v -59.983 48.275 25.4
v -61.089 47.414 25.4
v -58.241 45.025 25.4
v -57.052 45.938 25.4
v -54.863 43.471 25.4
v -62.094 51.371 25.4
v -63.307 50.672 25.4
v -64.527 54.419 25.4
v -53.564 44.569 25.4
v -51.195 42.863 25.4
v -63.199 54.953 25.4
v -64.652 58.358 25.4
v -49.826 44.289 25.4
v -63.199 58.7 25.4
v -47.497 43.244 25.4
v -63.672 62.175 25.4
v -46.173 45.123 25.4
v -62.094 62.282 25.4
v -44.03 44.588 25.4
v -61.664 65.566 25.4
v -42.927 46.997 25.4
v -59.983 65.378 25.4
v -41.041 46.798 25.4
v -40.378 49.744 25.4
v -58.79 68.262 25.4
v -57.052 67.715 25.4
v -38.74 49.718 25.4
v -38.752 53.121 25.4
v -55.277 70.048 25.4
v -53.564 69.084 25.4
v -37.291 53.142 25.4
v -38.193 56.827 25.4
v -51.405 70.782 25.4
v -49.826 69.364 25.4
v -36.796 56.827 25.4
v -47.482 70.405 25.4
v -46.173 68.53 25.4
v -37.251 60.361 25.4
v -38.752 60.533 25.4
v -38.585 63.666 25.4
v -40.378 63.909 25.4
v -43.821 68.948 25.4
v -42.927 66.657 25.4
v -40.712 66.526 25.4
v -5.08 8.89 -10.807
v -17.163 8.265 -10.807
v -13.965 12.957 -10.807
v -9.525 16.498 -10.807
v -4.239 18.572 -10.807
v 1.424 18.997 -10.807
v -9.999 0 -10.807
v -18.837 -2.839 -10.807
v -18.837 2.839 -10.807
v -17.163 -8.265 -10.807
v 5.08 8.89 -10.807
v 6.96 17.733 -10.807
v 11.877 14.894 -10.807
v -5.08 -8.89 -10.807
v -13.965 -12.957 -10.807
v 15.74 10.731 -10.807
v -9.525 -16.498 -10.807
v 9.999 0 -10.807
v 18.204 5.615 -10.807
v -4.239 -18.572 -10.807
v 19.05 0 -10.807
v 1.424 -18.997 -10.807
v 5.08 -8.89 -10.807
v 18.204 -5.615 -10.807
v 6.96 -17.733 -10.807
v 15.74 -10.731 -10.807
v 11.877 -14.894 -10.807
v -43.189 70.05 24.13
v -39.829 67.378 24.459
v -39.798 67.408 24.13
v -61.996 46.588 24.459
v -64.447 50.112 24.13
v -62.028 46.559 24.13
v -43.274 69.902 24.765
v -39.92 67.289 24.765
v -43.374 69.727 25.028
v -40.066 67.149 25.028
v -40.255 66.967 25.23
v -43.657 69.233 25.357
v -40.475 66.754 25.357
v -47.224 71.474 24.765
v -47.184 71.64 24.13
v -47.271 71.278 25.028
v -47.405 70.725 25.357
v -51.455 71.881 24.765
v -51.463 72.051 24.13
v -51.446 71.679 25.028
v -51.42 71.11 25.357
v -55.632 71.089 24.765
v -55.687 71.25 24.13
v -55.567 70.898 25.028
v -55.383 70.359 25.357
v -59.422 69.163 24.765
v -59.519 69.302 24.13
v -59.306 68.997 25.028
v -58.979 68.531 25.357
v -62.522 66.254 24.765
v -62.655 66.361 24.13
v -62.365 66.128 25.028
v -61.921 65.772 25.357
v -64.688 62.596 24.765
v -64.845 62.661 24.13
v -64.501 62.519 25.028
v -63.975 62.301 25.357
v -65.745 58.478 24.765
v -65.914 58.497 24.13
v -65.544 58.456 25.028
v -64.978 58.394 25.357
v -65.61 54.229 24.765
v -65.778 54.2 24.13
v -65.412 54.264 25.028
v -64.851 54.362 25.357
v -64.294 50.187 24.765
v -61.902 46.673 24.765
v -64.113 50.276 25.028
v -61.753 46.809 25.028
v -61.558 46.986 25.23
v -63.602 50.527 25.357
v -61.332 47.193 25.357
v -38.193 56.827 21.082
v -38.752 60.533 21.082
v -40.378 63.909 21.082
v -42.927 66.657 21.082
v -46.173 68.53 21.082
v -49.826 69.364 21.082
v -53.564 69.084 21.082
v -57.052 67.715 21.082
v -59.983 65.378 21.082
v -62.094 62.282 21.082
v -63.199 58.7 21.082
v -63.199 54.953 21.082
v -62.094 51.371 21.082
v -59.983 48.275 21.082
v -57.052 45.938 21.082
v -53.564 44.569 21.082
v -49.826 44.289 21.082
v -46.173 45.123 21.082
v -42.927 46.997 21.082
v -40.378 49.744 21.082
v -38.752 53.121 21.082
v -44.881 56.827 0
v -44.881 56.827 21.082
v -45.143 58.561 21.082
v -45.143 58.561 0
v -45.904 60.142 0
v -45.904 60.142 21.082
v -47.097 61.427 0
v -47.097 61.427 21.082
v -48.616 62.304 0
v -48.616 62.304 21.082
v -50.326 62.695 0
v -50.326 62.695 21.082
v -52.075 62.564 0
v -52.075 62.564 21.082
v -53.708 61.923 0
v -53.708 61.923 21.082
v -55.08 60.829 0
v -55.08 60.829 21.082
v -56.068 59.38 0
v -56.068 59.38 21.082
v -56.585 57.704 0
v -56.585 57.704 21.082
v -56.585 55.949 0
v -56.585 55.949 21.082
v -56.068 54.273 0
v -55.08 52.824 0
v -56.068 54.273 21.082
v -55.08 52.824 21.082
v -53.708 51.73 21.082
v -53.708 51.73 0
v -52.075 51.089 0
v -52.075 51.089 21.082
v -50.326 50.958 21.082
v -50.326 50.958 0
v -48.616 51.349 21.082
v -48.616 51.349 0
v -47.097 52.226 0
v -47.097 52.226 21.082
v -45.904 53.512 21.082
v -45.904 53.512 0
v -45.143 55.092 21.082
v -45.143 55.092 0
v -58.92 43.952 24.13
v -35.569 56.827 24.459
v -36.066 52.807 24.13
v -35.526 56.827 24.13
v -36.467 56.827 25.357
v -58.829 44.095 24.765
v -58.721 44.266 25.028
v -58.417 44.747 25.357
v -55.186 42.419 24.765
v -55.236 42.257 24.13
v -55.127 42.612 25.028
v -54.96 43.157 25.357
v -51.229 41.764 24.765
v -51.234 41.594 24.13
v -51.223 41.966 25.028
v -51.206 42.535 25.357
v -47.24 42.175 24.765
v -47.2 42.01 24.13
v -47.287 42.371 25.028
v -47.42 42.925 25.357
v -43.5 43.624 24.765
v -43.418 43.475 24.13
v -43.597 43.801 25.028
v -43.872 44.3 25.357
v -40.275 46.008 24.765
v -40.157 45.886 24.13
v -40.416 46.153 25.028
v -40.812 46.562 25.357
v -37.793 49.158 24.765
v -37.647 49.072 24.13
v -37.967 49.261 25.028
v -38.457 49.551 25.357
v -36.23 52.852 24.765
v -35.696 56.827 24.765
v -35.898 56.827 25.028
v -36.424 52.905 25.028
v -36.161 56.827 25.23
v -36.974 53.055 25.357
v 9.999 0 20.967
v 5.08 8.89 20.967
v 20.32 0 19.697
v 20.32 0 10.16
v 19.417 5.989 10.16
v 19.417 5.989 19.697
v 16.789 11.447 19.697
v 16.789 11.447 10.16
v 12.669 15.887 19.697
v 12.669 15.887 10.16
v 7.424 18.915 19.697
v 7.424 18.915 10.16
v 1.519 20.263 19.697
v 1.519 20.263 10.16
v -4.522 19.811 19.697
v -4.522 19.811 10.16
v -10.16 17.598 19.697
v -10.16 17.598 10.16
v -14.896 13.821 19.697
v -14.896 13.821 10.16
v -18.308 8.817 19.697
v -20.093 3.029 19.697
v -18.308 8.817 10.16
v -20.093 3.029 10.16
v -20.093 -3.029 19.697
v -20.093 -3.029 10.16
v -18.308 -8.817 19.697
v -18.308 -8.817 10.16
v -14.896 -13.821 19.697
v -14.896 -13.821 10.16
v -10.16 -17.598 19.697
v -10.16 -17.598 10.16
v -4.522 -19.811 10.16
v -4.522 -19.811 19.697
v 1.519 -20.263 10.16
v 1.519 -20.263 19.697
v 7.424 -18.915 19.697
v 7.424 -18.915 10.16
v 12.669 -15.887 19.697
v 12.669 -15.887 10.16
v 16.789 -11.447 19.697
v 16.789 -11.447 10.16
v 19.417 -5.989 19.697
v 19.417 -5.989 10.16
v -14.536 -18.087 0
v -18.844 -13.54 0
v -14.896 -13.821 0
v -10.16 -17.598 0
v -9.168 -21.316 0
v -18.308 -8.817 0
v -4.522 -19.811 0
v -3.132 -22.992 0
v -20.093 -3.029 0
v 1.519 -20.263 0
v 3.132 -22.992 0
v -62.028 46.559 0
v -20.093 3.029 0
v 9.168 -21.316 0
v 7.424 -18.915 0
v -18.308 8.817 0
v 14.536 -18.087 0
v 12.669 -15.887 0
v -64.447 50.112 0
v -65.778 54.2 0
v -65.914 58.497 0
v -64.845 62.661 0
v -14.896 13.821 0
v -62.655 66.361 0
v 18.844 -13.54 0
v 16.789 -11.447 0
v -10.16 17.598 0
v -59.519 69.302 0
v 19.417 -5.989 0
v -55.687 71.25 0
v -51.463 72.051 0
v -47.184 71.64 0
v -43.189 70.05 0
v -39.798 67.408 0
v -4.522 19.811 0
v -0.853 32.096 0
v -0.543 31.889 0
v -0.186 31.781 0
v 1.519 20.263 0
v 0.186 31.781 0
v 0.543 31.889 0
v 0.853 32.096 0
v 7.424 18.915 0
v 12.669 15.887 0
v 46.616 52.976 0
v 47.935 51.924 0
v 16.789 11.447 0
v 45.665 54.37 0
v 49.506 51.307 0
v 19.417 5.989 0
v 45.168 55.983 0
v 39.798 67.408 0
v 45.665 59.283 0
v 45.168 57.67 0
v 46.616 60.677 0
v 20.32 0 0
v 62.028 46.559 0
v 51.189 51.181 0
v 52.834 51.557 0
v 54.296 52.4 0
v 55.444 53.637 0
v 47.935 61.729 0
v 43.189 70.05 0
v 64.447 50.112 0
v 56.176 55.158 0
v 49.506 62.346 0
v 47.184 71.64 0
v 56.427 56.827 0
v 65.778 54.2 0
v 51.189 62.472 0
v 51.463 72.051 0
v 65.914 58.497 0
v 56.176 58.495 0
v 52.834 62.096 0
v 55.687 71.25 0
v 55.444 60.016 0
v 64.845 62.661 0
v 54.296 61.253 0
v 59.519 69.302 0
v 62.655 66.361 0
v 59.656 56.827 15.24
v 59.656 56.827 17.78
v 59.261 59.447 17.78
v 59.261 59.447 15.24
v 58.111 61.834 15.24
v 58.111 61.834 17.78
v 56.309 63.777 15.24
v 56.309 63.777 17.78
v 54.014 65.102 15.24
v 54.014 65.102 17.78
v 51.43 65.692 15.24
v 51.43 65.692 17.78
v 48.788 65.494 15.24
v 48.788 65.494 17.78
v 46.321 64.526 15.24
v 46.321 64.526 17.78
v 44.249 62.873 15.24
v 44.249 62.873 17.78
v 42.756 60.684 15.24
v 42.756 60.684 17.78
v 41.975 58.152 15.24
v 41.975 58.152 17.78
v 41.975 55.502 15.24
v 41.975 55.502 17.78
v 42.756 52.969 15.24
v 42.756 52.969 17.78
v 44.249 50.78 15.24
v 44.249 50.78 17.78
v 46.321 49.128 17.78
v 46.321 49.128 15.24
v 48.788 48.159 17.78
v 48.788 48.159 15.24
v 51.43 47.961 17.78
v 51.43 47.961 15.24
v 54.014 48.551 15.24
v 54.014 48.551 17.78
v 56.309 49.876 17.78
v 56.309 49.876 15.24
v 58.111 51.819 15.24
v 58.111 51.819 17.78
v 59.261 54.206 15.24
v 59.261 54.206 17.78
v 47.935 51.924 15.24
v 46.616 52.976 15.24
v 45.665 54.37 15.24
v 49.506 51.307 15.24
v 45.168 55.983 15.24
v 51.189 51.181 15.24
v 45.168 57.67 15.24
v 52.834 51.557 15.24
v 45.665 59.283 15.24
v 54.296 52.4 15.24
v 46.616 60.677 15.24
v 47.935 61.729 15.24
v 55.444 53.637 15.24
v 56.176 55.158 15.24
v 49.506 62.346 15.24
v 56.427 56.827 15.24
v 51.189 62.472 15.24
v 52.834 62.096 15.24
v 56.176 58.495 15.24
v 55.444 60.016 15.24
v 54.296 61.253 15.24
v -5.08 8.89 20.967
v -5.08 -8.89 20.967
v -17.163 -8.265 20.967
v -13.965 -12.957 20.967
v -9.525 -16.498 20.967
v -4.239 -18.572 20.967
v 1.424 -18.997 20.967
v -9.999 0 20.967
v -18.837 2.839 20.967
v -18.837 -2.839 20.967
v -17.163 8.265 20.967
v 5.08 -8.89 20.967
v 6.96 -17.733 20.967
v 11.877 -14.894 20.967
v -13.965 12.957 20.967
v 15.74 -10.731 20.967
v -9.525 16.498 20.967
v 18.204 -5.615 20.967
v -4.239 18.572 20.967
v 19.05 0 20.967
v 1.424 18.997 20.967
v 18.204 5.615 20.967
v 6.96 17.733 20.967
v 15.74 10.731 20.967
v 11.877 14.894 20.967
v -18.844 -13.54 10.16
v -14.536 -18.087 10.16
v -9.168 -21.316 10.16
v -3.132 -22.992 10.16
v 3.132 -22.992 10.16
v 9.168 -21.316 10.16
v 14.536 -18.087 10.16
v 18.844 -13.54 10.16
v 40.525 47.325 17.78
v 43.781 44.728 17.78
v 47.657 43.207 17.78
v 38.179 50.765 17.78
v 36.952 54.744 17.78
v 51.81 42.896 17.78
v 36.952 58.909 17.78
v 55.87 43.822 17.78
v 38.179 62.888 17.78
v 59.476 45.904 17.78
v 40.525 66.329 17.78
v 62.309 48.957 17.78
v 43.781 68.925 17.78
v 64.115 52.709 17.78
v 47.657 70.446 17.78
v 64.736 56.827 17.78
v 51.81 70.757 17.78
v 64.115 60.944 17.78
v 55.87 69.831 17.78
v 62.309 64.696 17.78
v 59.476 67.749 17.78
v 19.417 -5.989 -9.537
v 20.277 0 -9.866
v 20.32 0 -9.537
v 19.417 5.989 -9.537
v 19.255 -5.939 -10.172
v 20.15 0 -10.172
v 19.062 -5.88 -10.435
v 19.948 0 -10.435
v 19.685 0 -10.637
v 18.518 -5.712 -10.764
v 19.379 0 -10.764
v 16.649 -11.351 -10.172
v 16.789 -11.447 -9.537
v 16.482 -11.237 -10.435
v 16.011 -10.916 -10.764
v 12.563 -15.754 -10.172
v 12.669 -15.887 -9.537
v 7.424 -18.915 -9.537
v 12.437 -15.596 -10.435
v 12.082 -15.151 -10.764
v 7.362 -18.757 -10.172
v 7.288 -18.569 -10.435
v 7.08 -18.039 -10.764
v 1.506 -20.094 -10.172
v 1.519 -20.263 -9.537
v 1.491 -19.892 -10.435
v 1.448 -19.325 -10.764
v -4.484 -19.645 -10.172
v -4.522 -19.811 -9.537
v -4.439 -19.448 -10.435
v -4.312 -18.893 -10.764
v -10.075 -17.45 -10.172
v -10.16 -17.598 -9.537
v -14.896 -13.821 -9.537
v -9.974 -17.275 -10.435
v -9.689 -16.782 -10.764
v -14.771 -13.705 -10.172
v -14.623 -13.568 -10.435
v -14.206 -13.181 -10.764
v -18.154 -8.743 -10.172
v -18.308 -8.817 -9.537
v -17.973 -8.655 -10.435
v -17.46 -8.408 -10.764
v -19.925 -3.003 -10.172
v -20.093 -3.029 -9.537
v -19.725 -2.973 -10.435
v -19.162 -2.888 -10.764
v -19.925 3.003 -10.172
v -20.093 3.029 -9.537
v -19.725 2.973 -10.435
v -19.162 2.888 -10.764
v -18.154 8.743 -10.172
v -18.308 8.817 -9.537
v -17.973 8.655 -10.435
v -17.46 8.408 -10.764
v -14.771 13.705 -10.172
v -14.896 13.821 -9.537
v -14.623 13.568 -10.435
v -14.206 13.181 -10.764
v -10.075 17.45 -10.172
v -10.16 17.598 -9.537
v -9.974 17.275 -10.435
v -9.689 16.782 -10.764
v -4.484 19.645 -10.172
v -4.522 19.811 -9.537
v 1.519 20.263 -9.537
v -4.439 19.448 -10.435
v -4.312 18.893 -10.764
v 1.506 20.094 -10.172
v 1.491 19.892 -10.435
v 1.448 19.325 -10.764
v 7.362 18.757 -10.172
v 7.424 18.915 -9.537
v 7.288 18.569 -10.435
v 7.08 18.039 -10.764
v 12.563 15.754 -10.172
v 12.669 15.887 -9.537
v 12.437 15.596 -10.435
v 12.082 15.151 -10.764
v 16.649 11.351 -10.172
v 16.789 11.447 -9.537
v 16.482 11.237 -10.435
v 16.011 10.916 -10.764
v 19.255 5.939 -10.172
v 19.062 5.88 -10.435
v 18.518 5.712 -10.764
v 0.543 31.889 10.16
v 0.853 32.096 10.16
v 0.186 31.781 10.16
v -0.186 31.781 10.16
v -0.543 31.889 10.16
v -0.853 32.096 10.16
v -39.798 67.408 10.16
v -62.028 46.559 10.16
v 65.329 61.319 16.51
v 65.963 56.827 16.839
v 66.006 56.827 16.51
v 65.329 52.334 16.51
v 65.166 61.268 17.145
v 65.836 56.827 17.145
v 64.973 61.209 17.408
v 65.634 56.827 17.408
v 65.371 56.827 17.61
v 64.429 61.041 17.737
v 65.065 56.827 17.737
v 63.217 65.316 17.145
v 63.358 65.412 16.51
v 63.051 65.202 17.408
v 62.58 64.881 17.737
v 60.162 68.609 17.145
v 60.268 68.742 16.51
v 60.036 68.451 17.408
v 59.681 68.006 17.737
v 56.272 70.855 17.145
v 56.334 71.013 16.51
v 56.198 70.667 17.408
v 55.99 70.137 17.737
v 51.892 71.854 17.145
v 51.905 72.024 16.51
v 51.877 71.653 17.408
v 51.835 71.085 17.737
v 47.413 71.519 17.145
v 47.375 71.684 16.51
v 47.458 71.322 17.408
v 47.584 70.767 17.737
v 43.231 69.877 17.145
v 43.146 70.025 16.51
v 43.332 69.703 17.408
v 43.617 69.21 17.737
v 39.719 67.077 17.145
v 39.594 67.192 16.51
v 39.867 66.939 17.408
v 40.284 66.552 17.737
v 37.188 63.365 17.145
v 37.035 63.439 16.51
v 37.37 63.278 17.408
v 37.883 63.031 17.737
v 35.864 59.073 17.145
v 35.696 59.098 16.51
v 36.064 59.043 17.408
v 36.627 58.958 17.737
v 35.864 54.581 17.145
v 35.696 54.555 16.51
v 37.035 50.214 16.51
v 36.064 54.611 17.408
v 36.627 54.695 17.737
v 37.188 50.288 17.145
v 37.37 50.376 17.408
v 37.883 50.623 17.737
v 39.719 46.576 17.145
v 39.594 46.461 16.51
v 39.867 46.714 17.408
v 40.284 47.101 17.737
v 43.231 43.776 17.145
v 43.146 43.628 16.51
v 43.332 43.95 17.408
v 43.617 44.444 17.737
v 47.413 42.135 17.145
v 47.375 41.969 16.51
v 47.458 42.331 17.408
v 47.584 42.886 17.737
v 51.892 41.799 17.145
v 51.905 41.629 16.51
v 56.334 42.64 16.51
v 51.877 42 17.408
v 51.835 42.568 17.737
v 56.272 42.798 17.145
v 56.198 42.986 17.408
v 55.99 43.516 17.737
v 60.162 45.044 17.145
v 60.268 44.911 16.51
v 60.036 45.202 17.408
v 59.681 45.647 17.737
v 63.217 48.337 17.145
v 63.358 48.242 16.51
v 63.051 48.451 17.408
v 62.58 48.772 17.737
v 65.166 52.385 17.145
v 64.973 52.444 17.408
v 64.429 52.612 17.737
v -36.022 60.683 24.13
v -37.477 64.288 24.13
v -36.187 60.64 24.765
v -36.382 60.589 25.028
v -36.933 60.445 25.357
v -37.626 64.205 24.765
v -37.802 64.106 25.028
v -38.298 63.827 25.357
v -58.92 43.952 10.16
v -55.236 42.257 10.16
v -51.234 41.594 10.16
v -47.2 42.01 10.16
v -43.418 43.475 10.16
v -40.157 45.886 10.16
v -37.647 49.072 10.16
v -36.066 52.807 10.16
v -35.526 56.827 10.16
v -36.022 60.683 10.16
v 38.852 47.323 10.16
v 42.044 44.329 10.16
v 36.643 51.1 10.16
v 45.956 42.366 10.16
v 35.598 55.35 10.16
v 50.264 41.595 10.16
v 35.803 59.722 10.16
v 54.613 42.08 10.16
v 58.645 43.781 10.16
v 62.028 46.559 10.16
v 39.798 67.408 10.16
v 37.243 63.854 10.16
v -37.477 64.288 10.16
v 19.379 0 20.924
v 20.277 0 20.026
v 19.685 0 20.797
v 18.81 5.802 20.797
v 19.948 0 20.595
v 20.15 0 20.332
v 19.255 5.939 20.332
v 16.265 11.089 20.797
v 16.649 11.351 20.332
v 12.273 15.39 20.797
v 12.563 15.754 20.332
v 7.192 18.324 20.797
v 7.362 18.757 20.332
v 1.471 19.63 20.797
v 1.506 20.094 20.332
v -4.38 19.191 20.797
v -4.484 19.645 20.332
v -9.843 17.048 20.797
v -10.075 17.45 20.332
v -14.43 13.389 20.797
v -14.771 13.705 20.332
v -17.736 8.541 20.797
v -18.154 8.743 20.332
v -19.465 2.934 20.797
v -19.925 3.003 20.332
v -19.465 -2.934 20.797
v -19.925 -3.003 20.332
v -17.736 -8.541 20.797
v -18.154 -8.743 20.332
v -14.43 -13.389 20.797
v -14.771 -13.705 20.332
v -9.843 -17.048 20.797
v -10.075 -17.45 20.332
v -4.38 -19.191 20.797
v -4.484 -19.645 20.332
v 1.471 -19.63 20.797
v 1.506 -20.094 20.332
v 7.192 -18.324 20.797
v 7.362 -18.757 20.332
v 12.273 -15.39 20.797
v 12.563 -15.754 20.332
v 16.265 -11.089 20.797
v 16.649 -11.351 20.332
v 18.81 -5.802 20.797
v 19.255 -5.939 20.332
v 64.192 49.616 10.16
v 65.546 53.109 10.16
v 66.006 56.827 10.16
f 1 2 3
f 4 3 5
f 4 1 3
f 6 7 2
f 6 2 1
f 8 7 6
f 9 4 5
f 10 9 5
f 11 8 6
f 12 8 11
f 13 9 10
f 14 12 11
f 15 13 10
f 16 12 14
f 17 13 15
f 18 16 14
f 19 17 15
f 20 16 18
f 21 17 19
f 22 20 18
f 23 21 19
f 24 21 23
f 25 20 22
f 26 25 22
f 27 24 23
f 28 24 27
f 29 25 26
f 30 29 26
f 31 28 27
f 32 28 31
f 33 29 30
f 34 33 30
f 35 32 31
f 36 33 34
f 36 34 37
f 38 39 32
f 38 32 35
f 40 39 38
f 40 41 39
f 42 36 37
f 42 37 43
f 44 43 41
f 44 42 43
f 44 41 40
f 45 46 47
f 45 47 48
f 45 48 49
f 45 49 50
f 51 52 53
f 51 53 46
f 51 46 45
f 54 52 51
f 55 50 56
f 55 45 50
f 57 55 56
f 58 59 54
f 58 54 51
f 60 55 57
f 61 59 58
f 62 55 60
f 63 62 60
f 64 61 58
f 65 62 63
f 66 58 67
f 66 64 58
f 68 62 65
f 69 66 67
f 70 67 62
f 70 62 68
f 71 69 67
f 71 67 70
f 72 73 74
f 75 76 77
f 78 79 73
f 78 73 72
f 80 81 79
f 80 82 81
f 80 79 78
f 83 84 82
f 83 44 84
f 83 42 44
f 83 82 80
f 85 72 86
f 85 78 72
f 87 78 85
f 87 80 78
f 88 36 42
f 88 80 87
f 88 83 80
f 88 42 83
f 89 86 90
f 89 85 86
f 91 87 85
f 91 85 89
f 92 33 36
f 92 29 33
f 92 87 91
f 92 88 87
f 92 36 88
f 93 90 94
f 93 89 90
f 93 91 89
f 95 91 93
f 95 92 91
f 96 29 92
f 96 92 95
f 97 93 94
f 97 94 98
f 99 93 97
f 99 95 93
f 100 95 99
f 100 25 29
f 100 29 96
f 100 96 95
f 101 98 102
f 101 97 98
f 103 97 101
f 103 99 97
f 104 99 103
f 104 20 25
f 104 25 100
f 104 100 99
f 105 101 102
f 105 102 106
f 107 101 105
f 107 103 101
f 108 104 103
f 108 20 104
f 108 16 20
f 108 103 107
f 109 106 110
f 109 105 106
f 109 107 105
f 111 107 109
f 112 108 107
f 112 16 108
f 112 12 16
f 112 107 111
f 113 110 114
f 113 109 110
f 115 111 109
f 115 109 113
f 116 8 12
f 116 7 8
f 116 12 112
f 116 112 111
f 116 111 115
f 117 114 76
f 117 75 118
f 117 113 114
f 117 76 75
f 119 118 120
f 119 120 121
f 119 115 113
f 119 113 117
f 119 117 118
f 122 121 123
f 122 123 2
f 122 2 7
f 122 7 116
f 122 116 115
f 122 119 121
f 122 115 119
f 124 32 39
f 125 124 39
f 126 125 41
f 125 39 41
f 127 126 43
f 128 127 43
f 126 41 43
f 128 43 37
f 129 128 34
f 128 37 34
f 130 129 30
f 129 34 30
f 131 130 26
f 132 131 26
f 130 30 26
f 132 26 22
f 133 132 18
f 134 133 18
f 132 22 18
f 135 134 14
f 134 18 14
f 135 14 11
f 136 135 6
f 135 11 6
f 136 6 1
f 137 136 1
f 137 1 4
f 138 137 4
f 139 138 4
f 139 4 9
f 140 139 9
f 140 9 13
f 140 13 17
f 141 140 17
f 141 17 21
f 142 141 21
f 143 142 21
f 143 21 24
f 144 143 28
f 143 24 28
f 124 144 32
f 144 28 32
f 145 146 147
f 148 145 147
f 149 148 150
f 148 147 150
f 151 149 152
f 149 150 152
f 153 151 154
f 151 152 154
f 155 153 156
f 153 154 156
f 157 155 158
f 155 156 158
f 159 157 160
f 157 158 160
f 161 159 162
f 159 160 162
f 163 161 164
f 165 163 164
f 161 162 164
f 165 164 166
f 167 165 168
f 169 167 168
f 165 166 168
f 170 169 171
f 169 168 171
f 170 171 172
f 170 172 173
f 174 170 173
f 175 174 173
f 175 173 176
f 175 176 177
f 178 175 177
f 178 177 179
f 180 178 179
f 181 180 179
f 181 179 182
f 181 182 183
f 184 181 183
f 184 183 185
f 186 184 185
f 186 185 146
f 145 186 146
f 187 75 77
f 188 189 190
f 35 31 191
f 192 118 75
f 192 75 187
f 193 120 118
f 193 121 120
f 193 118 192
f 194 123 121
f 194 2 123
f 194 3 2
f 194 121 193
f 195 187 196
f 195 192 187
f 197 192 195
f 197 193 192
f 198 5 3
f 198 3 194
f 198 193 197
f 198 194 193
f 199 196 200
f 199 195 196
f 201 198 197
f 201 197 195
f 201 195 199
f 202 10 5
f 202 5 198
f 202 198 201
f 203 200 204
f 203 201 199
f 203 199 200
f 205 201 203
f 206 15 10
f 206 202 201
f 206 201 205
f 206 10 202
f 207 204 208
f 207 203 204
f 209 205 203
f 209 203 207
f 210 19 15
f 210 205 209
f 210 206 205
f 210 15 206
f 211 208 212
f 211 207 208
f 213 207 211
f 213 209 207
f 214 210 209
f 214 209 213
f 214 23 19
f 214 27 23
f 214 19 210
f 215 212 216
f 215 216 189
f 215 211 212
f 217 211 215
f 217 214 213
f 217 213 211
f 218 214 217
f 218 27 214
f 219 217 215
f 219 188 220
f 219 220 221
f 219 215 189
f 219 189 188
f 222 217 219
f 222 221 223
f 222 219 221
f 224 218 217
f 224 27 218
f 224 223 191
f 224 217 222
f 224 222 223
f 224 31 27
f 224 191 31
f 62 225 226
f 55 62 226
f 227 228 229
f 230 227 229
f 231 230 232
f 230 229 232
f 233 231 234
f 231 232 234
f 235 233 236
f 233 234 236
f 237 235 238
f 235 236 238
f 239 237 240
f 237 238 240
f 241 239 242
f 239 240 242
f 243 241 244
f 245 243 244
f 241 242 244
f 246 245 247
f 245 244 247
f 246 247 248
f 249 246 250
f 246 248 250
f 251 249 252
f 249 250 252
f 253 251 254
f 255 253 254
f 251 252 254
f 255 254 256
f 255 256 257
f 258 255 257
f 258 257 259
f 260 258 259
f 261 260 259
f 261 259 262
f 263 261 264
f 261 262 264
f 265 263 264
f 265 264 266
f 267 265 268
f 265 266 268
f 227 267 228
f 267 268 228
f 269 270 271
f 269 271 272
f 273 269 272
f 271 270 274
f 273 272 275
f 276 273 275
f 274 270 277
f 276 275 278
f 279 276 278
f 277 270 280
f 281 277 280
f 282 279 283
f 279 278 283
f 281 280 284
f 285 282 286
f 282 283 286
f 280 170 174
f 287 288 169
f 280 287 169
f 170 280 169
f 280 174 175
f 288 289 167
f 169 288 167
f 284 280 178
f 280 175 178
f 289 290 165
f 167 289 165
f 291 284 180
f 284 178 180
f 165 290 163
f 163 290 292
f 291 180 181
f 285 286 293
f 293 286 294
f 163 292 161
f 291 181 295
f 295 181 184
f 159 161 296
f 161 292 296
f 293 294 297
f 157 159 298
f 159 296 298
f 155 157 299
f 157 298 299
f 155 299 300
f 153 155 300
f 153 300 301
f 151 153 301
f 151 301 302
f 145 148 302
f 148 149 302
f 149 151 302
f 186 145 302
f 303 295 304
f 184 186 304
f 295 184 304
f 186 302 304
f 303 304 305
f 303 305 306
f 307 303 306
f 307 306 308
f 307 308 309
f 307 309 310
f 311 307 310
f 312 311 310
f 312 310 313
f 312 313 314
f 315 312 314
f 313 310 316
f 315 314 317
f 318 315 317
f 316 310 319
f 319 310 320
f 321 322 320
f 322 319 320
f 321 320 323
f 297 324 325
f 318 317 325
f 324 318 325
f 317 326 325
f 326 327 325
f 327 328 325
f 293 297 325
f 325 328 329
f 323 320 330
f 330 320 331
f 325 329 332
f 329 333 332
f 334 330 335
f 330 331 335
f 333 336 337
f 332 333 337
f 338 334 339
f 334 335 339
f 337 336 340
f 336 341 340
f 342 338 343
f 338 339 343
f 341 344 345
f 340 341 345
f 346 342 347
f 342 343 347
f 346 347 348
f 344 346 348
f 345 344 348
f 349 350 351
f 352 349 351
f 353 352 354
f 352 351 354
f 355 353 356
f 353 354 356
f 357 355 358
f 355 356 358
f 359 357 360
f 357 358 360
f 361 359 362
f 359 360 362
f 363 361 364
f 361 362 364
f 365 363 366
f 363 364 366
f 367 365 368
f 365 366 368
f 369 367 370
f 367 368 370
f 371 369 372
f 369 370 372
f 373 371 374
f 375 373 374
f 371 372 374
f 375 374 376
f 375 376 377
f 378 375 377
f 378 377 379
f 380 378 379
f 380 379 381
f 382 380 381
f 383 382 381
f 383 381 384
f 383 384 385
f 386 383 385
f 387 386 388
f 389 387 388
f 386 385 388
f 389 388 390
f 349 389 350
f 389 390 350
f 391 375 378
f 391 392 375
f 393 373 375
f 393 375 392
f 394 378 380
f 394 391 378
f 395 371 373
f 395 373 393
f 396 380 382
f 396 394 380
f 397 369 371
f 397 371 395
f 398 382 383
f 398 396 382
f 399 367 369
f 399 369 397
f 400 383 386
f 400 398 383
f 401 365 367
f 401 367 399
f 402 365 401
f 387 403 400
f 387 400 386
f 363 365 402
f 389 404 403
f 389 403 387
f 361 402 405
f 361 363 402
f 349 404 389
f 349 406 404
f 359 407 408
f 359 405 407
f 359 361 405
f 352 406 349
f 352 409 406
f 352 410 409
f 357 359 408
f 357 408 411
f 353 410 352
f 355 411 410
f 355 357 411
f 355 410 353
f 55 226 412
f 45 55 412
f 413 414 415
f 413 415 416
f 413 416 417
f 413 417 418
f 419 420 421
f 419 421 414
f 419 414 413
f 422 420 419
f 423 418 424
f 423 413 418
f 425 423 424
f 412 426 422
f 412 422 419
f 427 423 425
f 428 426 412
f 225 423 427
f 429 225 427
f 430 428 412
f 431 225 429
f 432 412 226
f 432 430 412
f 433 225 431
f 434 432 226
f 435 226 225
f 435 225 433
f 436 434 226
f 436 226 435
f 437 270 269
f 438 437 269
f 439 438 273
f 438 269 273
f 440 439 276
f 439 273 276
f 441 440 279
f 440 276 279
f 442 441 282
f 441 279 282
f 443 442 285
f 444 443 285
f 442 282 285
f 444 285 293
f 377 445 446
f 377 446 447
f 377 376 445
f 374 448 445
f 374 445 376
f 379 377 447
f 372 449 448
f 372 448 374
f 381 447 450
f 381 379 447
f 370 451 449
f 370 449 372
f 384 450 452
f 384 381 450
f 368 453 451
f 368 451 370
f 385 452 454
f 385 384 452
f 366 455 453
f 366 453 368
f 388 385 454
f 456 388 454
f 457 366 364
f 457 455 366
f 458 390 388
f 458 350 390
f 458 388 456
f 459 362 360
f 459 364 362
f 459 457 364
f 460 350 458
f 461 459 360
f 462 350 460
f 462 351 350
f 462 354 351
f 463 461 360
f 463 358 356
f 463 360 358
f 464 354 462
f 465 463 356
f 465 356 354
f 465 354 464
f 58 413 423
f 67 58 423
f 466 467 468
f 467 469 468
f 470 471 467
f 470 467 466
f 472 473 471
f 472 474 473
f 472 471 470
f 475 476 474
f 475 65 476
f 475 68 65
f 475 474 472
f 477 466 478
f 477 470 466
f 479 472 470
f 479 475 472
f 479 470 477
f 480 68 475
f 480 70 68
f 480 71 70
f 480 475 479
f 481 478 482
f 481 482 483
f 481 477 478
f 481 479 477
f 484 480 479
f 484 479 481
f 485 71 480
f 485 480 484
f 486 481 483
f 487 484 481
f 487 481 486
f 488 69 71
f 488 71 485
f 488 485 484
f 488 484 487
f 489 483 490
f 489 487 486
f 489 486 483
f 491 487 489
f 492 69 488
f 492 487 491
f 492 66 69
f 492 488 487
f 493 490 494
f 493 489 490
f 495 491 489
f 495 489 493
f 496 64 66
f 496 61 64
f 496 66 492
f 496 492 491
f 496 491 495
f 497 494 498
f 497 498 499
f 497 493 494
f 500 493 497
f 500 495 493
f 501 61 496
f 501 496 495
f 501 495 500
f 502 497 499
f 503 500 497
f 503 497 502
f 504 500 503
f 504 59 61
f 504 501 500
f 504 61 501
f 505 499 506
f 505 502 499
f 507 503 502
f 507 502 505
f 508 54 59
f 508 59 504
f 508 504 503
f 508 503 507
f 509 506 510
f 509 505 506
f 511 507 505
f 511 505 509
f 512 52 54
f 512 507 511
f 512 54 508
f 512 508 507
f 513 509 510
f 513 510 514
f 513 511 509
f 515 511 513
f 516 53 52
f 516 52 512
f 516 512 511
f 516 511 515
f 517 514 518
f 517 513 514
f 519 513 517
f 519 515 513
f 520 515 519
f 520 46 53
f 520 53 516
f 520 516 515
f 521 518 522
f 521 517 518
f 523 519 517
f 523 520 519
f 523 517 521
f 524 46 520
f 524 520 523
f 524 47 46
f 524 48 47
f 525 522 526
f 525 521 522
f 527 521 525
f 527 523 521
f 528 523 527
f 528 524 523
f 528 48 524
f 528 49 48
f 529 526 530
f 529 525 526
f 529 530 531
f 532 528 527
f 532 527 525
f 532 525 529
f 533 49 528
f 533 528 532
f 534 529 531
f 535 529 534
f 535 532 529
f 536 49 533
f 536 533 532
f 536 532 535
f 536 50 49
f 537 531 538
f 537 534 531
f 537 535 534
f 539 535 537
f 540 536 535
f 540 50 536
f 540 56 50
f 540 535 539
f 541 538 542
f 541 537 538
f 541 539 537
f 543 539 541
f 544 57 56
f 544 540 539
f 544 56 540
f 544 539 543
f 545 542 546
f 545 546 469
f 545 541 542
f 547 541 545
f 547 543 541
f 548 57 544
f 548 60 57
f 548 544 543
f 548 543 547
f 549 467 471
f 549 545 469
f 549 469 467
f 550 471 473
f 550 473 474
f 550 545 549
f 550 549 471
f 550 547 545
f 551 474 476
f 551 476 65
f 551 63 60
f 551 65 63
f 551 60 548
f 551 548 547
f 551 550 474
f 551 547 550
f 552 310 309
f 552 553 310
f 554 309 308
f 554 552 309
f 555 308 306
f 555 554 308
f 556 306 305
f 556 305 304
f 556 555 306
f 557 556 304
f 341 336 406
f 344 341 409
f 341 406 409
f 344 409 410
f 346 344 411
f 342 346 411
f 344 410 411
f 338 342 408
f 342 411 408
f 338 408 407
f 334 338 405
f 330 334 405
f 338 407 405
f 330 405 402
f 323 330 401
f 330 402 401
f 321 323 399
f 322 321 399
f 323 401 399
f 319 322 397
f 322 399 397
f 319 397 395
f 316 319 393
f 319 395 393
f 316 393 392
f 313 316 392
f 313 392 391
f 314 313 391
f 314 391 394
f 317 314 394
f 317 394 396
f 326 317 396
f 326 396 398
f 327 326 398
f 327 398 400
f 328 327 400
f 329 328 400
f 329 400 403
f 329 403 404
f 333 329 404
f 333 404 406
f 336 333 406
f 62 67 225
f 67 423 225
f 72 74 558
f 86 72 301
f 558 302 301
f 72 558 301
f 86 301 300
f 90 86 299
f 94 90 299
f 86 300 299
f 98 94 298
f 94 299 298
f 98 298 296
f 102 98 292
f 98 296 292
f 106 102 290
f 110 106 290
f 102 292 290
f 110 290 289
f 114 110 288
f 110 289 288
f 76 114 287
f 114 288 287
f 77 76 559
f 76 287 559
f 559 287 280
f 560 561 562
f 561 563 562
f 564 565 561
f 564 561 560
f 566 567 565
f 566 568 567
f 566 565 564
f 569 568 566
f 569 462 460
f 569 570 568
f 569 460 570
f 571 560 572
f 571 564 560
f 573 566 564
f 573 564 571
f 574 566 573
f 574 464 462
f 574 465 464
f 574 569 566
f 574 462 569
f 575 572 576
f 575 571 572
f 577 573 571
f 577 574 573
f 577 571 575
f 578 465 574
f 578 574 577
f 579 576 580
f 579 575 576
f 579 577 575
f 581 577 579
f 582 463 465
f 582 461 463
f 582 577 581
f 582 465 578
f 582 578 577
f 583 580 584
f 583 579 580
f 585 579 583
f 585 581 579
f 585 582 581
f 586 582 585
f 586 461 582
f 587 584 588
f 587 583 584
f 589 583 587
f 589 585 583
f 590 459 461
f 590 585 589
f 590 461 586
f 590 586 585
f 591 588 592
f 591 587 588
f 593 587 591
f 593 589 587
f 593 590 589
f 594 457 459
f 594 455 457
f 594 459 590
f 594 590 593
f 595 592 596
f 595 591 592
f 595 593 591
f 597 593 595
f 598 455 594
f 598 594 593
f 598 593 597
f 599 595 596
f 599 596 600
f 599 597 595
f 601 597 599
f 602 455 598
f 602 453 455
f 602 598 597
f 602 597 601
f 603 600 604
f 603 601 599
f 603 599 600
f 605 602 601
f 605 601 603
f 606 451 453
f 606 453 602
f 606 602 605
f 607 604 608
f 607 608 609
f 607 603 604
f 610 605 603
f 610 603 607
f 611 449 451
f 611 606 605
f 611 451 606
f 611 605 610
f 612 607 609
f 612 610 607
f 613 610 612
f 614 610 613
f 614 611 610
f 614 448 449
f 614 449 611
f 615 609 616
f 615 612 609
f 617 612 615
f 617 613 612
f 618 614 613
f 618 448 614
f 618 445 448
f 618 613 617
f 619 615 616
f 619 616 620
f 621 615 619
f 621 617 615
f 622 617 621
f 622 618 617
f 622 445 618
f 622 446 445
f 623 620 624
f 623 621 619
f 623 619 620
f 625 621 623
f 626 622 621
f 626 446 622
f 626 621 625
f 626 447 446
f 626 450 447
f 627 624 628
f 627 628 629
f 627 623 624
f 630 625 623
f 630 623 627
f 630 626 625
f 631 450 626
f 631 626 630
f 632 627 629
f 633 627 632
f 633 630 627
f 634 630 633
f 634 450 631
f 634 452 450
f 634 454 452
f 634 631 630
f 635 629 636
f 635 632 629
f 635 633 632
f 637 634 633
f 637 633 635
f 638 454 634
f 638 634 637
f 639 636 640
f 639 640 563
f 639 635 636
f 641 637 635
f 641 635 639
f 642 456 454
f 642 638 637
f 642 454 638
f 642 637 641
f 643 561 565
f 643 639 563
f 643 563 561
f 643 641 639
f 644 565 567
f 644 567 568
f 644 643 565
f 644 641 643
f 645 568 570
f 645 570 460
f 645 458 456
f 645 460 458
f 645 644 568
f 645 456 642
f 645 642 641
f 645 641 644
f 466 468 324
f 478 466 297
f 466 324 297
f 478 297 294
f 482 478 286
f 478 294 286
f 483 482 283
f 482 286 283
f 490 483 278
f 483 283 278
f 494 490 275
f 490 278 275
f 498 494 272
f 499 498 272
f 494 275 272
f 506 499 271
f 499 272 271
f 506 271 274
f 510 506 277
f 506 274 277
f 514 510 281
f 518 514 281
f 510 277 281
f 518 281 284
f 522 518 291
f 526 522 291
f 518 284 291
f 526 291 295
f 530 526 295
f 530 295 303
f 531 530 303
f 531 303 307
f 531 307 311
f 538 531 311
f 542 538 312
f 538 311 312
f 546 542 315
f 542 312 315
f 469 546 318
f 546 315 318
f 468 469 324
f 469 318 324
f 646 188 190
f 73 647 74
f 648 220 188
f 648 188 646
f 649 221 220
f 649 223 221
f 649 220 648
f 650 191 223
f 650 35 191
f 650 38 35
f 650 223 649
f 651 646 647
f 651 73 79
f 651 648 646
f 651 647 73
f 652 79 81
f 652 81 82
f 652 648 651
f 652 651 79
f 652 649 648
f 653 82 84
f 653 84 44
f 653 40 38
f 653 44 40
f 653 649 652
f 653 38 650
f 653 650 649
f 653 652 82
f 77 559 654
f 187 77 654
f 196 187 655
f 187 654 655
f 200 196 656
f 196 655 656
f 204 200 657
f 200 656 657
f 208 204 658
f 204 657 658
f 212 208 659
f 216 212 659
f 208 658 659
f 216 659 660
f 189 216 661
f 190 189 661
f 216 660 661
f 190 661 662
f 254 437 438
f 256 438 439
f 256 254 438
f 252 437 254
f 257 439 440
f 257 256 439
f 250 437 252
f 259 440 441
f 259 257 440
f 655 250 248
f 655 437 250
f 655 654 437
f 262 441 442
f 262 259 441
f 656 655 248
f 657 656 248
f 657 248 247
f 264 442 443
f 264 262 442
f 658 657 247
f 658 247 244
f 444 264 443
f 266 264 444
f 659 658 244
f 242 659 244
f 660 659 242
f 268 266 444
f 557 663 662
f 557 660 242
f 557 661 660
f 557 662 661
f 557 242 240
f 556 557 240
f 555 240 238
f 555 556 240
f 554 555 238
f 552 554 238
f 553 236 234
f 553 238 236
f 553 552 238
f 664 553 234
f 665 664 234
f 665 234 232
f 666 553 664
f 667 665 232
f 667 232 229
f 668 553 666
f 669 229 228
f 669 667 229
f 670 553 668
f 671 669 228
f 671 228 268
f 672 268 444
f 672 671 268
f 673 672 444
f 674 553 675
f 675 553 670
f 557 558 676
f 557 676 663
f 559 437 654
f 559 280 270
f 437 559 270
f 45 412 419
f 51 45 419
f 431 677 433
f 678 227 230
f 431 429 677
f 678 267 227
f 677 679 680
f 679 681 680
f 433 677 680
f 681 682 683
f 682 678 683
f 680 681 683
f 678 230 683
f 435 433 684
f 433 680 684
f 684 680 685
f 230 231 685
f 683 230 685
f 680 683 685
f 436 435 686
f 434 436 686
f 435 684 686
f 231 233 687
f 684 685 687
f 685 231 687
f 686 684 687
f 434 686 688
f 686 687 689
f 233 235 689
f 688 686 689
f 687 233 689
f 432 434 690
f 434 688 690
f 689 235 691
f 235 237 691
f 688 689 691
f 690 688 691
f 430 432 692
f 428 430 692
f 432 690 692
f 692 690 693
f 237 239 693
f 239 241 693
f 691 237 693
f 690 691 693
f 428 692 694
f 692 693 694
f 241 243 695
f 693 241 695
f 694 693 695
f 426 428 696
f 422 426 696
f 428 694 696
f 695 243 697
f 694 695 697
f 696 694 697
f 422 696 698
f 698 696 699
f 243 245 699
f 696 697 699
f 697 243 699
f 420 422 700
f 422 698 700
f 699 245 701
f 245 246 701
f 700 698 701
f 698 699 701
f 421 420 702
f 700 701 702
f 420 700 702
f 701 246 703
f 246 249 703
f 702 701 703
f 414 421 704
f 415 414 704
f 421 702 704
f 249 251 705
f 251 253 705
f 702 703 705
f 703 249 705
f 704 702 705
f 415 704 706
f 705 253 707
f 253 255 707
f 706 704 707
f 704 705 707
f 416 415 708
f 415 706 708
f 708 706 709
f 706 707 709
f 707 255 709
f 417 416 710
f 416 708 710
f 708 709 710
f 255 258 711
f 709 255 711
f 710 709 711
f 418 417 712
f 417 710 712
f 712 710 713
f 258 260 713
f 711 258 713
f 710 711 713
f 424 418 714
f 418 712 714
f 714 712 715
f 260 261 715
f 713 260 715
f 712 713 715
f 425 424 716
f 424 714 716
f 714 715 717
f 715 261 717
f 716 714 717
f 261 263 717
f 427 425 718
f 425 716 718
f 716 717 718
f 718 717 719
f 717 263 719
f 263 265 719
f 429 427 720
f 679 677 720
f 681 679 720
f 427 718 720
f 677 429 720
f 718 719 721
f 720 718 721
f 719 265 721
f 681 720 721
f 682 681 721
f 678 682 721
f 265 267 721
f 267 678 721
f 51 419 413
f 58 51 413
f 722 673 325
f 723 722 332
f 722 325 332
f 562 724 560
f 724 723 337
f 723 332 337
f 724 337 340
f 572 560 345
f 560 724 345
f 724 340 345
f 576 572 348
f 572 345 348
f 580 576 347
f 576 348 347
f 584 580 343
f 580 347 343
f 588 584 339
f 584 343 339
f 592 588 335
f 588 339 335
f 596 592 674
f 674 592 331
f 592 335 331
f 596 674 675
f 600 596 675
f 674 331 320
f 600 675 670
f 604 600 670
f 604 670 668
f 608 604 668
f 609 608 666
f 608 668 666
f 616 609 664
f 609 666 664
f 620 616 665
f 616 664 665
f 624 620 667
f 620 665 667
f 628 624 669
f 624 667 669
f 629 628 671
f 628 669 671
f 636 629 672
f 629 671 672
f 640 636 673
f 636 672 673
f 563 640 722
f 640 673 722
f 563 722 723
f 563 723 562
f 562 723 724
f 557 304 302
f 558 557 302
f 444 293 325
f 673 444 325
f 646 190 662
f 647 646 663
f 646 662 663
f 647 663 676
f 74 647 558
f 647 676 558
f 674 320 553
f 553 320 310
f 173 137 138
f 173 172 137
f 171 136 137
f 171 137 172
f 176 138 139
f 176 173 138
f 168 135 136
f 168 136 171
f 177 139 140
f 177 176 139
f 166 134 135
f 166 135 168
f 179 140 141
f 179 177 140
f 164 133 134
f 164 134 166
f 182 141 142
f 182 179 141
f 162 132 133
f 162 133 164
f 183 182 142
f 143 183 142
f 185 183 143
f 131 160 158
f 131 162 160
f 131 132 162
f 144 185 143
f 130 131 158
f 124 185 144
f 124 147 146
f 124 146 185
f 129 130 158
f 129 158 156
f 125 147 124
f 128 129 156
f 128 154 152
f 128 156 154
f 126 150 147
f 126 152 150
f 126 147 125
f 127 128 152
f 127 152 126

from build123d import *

# Parameters (mm, degrees)
F1_DEPTH      = 10.16
F2_R          = 15.24
F3_DEPTH      = 7.62
F4_R          = 1.27
F5_R          = 8.89
F6_DEPTH      = 2.54
F6_DEPTH_BACK = 25.4
F7_R          = 5.6612408529
F8_DEPTH      = 15.241
F9_R          = 1.27
F11_DEPTH     = 15.24
F12_R         = 1.27
F13_R         = 12.573
F14_DEPTH     = 4.318
F15_R         = 5.8846996184
F16_DEPTH     = 21.083
F17_R         = 20.32
F18_DEPTH     = 10.80698
F20_DEPTH     = 25.4
F21_R         = 20.32
F3_FACE_R     = 13.97
F3_FACE_R_2   = 8.89
F22_DEPTH     = 10.8069888
F23_R         = 1.27


with BuildPart() as f1:
    # F0 (on Top) → F1 (new body)
    with BuildSketch(Plane.XY):
        with BuildLine():
            Line((0, 31.3225206132), (-39.7978979795, 67.4076240142))
            ThreePointArc((-39.7978979795, 67.4076240142), (-61.191545749, 67.9425235548), (-62.027639853, 46.5585288613))
            Line((-62.027639853, 46.5585288613), (-18.8440847739, -13.5402782767))
            ThreePointArc((-18.8440847739, -13.5402782767), (0, -23.2042812165), (18.8440847739, -13.5402782767))
            Line((18.8440847739, -13.5402782767), (62.027639853, 46.5585288613))
            ThreePointArc((62.027639853, 46.5585288613), (61.191545749, 67.9425235548), (39.7978979795, 67.4076240142))
            Line((39.7978979795, 67.4076240142), (0, 31.3225206132))
        make_face()
    extrude(amount=F1_DEPTH)

    # F2 (on face) → F3 (join)
    with BuildSketch(Plane.XY.offset(10.16)):
        with Locations((50.7659645325, 56.8265505295)):
            Circle(F2_R)
    extrude(amount=F3_DEPTH)

    # F4
    f4_edges = [f1.edges().sort_by_distance(p)[0] for p in [
        (35.525965, 56.826551, 17.78),
    ]]
    fillet(f4_edges, radius=F4_R)

    # F5 (on face) → F6 (cut, two sides)
    with BuildSketch(Plane.XY.offset(17.78)) as f6_sk:
        with Locations((50.7659645325, 56.8265505295)):
            Circle(F5_R)
    extrude(amount=-F6_DEPTH, mode=Mode.SUBTRACT)
    extrude(f6_sk.sketch, amount=F6_DEPTH_BACK, mode=Mode.SUBTRACT)

    # F7 (on face) → F8 (cut, through all)
    with BuildSketch(Plane.XY.offset(15.24)):
        with Locations((50.7659645325, 56.8265505295)):
            Circle(F7_R)
    extrude(amount=-F8_DEPTH, mode=Mode.SUBTRACT)

    # F9
    f9_edges = [f1.edges().sort_by_distance(p)[0] for p in [
        (0, 31.322521, 5.08),
    ]]
    fillet(f9_edges, radius=F9_R)

    # F10 (on face) → F11 (join)
    with BuildSketch(Plane.XY.offset(10.16)):
        with BuildLine():
            ThreePointArc((-62.027639853, 46.5585288613), (-45.260073682, 42.6158937557), (-35.5259645325, 56.8265505295))
            ThreePointArc((-35.5259645325, 56.8265505295), (-36.6342460548, 62.5319981777), (-39.7978979795, 67.4076240142))
            ThreePointArc((-39.7978979795, 67.4076240142), (-61.191545749, 67.9425235548), (-62.027639853, 46.5585288613))
        make_face()
    extrude(amount=F11_DEPTH)

    # F12
    f12_edges = [f1.edges().sort_by_distance(p)[0] for p in [
        (-61.734031, 46.245477, 25.4),
    ]]
    fillet(f12_edges, radius=F12_R)

    # F13 (on face) → F14 (cut)
    with BuildSketch(Plane.XY.offset(25.4)):
        with Locations((-50.7659645325, 56.8265505295)):
            Circle(F13_R)
    extrude(amount=-F14_DEPTH, mode=Mode.SUBTRACT)

    # F15 (on face) → F16 (cut, through all)
    with BuildSketch(Plane.XY.offset(21.082)):
        with Locations((-50.7659645325, 56.8265505295)):
            Circle(F15_R)
    extrude(amount=-F16_DEPTH, mode=Mode.SUBTRACT)

    # F17 (on face) → F18 (join)
    with BuildSketch(Plane.XY.offset(10.16)):
        Circle(F17_R)
    extrude(amount=F18_DEPTH)

    # F19 (on face) → F20 (cut)
    with BuildSketch(Plane.XY.offset(20.96698)):
        Polygon((5.08, 8.89), (-5.08, 8.89), (-9.9986888497, 0), (-5.08, -8.89), (5.08, -8.89), (9.9986888497, 0), align=None)
    extrude(amount=-F20_DEPTH, mode=Mode.SUBTRACT)

    # F21 (on face) + F3_face (on face) → F22 (join)
    with BuildSketch(Plane(origin=(0, 0, 0), x_dir=(1, 0, 0), z_dir=(0, 0, -1))):
        Circle(F21_R)
        Polygon((5.08, 8.89), (9.9986888497, 0), (5.08, -8.89), (-5.08, -8.89), (-9.9986888497, 0), (-5.08, 8.89), align=None, mode=Mode.SUBTRACT)
    with BuildSketch(Plane(origin=(50.7659645325, 56.8265505295, 17.78), x_dir=(1, 0, 0), z_dir=(0, 0, 1))):
        Circle(F3_FACE_R)
        Circle(F3_FACE_R_2, mode=Mode.SUBTRACT)
    extrude(amount=F22_DEPTH, dir=(0, 0, -1))

    # F23
    f23_edges = [f1.edges().sort_by_distance(p)[0] for p in [
        (-20.32, 0, 20.96698),
        (-20.32, 0, -10.806989),
    ]]
    fillet(f23_edges, radius=F23_R)


solid = f1.part
